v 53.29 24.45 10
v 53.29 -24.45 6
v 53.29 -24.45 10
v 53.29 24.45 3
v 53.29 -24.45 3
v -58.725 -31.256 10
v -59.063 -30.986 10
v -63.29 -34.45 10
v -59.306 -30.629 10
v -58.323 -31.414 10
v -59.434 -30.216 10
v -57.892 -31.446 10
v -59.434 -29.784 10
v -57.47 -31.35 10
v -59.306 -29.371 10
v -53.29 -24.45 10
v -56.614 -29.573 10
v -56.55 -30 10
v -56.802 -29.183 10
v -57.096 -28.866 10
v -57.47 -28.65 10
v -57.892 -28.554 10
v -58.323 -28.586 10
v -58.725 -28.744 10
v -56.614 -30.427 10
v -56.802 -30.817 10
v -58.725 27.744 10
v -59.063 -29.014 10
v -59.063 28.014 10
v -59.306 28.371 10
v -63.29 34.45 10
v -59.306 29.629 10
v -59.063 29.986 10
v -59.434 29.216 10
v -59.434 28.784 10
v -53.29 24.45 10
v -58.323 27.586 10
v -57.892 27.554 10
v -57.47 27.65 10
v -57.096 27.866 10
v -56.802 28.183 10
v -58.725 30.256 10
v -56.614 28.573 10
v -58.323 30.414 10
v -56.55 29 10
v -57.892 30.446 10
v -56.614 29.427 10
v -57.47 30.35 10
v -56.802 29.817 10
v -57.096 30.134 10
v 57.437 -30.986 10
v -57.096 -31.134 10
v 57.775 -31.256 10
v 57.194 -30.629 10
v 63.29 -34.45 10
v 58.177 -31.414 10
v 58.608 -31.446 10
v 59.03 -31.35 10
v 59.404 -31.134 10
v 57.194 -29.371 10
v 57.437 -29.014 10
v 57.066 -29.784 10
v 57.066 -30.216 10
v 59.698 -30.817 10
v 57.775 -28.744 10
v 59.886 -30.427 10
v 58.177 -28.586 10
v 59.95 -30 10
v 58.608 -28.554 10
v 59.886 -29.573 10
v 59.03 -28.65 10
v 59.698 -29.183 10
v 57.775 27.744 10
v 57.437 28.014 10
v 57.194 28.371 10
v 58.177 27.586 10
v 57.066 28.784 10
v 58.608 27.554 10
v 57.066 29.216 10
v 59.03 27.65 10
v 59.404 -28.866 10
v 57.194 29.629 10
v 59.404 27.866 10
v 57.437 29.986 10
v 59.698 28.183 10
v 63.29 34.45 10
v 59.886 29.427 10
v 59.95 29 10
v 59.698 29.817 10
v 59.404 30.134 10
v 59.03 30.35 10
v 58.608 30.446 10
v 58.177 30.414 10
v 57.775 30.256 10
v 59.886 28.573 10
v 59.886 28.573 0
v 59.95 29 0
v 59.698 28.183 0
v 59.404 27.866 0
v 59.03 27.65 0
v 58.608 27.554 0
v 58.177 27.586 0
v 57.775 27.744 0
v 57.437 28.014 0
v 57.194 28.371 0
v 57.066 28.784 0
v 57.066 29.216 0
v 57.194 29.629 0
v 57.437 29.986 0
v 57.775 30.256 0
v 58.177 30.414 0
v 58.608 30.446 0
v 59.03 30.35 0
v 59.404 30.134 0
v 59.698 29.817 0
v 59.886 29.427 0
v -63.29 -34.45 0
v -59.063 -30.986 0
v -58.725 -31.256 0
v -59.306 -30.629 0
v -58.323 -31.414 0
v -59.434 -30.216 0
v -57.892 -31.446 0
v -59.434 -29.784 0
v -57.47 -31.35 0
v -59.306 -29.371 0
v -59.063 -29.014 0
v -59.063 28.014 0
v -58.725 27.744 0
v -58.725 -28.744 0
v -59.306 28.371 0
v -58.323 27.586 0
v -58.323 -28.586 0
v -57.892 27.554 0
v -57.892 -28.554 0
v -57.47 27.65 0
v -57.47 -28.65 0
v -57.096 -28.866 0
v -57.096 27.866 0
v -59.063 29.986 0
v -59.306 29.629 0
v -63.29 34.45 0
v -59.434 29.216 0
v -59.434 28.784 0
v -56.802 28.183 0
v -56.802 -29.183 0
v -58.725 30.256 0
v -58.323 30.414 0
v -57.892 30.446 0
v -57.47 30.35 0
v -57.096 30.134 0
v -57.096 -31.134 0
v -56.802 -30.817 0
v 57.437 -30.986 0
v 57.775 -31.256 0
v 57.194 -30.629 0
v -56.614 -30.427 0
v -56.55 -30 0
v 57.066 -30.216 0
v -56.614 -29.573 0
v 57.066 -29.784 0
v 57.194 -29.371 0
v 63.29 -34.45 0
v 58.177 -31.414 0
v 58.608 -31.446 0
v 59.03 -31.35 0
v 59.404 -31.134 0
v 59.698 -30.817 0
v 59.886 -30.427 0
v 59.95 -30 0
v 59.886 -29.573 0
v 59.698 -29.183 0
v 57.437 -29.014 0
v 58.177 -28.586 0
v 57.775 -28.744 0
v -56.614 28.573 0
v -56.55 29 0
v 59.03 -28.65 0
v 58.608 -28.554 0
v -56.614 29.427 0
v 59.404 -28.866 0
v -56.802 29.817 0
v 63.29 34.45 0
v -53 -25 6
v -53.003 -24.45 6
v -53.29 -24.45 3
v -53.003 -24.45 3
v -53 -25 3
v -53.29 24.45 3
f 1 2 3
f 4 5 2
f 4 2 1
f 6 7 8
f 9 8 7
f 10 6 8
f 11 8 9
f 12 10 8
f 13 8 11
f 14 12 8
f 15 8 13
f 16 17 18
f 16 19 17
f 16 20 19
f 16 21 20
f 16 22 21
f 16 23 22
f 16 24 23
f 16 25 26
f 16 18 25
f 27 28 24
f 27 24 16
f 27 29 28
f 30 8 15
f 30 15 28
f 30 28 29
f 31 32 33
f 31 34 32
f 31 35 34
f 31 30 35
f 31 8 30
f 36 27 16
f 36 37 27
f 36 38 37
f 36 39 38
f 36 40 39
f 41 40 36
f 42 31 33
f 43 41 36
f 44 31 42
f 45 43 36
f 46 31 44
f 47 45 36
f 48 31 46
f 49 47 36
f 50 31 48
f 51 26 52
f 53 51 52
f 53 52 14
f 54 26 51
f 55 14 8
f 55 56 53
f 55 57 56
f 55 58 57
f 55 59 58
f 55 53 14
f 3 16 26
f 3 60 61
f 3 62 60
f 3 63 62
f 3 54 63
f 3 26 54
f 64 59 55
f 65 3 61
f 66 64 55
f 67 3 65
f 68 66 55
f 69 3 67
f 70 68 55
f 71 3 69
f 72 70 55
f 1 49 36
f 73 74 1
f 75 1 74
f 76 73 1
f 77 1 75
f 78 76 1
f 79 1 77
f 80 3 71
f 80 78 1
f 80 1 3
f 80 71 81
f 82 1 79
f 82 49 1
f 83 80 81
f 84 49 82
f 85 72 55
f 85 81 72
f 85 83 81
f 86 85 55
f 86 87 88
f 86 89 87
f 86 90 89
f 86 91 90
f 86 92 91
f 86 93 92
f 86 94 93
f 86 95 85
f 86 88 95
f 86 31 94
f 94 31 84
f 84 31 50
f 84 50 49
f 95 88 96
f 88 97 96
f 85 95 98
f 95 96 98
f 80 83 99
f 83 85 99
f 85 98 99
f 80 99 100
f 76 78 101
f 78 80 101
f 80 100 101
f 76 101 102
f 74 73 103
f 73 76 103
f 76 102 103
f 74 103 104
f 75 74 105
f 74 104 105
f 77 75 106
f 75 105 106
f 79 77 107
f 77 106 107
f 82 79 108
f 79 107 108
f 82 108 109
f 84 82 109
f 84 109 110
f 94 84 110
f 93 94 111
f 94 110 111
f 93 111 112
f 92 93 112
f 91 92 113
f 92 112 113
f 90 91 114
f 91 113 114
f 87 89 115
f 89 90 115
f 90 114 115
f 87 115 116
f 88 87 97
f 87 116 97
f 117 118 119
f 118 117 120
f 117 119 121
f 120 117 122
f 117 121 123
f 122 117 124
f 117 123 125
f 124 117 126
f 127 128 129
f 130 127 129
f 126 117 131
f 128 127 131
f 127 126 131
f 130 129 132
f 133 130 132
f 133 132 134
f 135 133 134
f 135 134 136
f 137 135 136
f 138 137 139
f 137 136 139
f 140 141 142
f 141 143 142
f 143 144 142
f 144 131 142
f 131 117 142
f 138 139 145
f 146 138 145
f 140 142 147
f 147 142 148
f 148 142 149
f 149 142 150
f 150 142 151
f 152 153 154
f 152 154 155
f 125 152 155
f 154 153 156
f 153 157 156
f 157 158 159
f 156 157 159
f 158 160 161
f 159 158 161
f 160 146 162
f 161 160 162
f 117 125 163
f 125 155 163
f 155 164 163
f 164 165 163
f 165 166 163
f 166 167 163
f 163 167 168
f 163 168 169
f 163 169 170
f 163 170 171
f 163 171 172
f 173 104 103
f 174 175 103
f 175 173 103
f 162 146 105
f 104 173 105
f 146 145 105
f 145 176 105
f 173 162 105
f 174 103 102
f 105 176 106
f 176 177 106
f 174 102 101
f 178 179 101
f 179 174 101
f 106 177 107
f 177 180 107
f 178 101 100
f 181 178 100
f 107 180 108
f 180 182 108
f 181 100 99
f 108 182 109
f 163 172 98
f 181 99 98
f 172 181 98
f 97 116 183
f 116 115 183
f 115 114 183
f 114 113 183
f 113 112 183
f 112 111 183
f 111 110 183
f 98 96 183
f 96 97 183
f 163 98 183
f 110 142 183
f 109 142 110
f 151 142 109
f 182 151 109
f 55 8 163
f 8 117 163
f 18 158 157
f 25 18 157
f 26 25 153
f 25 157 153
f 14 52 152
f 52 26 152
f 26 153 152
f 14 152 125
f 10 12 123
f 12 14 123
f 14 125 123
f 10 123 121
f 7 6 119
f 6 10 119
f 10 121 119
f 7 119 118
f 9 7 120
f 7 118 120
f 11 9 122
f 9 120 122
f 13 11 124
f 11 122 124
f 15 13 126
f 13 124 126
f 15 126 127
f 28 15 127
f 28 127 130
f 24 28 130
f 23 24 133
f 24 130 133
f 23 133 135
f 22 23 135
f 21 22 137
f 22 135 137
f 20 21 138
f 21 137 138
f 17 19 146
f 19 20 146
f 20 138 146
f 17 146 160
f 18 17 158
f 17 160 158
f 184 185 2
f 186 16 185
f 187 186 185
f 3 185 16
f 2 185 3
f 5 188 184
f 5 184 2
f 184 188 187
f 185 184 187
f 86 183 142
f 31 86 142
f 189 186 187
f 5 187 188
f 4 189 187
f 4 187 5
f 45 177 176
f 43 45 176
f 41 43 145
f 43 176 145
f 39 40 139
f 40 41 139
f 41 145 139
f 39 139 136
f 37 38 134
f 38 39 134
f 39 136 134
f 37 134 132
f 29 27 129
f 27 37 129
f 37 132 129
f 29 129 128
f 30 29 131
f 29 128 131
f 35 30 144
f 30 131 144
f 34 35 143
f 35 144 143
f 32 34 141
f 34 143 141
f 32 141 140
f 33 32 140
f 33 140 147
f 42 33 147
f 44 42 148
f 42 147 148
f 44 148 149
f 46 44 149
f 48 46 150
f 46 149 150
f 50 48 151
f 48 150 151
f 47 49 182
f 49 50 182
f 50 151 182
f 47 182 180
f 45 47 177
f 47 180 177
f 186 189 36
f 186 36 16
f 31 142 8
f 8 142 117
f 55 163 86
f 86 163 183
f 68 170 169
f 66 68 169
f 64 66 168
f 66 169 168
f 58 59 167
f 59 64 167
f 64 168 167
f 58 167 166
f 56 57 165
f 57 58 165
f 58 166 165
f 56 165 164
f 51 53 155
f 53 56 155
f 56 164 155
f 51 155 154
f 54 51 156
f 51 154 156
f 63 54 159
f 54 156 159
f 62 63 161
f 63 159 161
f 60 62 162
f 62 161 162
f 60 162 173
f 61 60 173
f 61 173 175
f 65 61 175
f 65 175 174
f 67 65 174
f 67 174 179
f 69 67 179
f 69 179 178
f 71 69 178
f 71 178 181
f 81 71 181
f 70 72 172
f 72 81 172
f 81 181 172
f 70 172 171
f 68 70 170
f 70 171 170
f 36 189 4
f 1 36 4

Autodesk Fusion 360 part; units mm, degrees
sketch "Sketch4" plane through (0, 0, 0) normal (0, 0, 1) x (1, 0, 0)
  line L0 (53.2905, 24.45) -> (-53.2905, 24.45)
  line L1 (-53.2905, 24.45) -> (-53.2905, -24.45)
  line L2 (-53.2905, -24.45) -> (53.2905, -24.45)
  line L3 (53.2905, -24.45) -> (53.2905, 24.45)
  line L4 (53.2905, 24.45) -> (-53.2905, -24.45) construction
  line L5 (-53.2905, 24.45) -> (53.2905, -24.45) construction
  line L6 (-63.2905, -34.45) -> (63.2905, -34.45)
  line L7 (63.2905, -34.45) -> (63.2905, 34.45)
  line L8 (63.2905, 34.45) -> (-63.2905, 34.45)
  line L9 (-63.2905, 34.45) -> (-63.2905, -34.45)
  line L10 (-63.2905, -34.45) -> (63.2905, 34.45) construction
  line L11 (63.2905, -34.45) -> (-63.2905, 34.45) construction
  circle A0 centre (-58, 29) radius 1.45
  circle A1 centre (-58, -30) radius 1.45
  circle A2 centre (58.5, 29) radius 1.45
  circle A3 centre (58.5, -30) radius 1.45
  point P0 (-58, -30)
  dimension "d20" = 10
  dimension "d21" = 10
  dimension "d22" = 10
  dimension "d23" = 10
  dimension "d24" = 48.9
  dimension "d25" = 106.581
  dimension "d26" = 126.581
  dimension "d27" = 68.9
  dimension "d34" = 2.9
  dimension "d38" = 2.9
  dimension "d39" = 2.9
  dimension "d40" = 2.9
extrude "Extrude1" add sketch "Sketch4" along normal blind 3 contours L0 L1 L2 L3
extrude "Extrude2" add sketch "Sketch4" along normal blind 10 contours L6 L7 L8 L9 | A0 | A1 | A2 | A3
extrude "Extrude3" cut sketch "Sketch4" along normal blind 14 contours A0
extrude "Extrude4" cut sketch "Sketch4" along normal blind 14 contours A1
extrude "Extrude5" cut sketch "Sketch4" along normal blind 14 contours A3
extrude "Extrude6" cut sketch "Sketch4" along normal blind 14 contours A2
sketch "plate-2026-06-09T10_15_21.263Z" plane through (0, 0, 3) normal (0, 0, 1) x (1, 0, 0)
  line L0 (-24.2585, 6.9573) -> (-11.2585, 6.9573)
  line L1 (-24.2585, -7.0427) -> (-11.2585, -7.0427)
  line L2 (-24.7585, 6.4573) -> (-24.7585, -6.5427)
  line L3 (-10.7585, 6.4573) -> (-10.7585, -6.5427)
  arc A0 (-24.2585, 6.9573) -> (-24.7585, 6.4573) centre (-24.2585, 6.4573) ccw
  arc A1 (-10.7585, 6.4573) -> (-11.2585, 6.9573) centre (-11.2585, 6.4573) ccw
  arc A2 (-24.7585, -6.5427) -> (-24.2585, -7.0427) centre (-24.2585, -6.5427) ccw
  arc A3 (-11.2585, -7.0427) -> (-10.7585, -6.5427) centre (-11.2585, -6.5427) ccw
  line L4 (-5.2085, 6.9573) -> (7.7915, 6.9573)
  line L5 (-5.2085, -7.0427) -> (7.7915, -7.0427)
  line L6 (-5.7085, 6.4573) -> (-5.7085, -6.5427)
  line L7 (8.2915, 6.4573) -> (8.2915, -6.5427)
  arc A4 (-5.2085, 6.9573) -> (-5.7085, 6.4573) centre (-5.2085, 6.4573) ccw
  arc A5 (8.2915, 6.4573) -> (7.7915, 6.9573) centre (7.7915, 6.4573) ccw
  arc A6 (-5.7085, -6.5427) -> (-5.2085, -7.0427) centre (-5.2085, -6.5427) ccw
  arc A7 (7.7915, -7.0427) -> (8.2915, -6.5427) centre (7.7915, -6.5427) ccw
  line L8 (13.8415, 6.9573) -> (26.8415, 6.9573)
  line L9 (13.8415, -7.0427) -> (26.8415, -7.0427)
  line L10 (13.3415, 6.4573) -> (13.3415, -6.5427)
  line L11 (27.3415, 6.4573) -> (27.3415, -6.5427)
  arc A8 (13.8415, 6.9573) -> (13.3415, 6.4573) centre (13.8415, 6.4573) ccw
  arc A9 (27.3415, 6.4573) -> (26.8415, 6.9573) centre (26.8415, 6.4573) ccw
  arc A10 (13.3415, -6.5427) -> (13.8415, -7.0427) centre (13.8415, -6.5427) ccw
  arc A11 (26.8415, -7.0427) -> (27.3415, -6.5427) centre (26.8415, -6.5427) ccw
  line L12 (-53, -25) -> (53.2905, -24.45)
  line L13 (-53.2905, 24.45) -> (53.2905, 24.45)
  line L14 (-53, -25) -> (-53.2905, 24.45)
  line L15 (53.2905, -24.45) -> (53.2905, 24.45)
  line L16 (53.2905, -24.45) -> (53.2905, 24.45)
  line L17 (53.2905, 24.45) -> (-53.2905, 24.45)
  dimension "d65" = 13
  dimension "d66" = 13
  dimension "d67" = 13
  dimension "d68" = 13
  dimension "d69" = 13
  dimension "d70" = 13
  dimension "d71" = 49.45
  dimension "d72" = 106.2905
extrude "Extrude7" add sketch "plate-2026-06-09T10_15_21.263Z" along normal blind 3
extrude "Extrude8" cut sketch "plate-2026-06-09T10_15_21.263Z" along normal blind 3
